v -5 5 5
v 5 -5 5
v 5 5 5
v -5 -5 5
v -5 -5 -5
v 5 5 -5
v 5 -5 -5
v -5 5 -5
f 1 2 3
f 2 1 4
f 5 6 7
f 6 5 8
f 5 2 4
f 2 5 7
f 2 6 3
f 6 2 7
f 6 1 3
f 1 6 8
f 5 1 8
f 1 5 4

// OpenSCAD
// A deliberately tiny OpenSCAD cartridge: the integration test's whole job is to prove
// the RUNNER works (command shape, OPENSCADPATH, STL back through the mesh bar), so the
// geometry is the simplest thing that can be watertight and have positive volume.
//
// It dispatches on BOTH the numeric render_mode (what the platform sends for a part
// whose manifest declares one) and the target_part string (what a cartridge that
// dispatches by name reads), because the renderer passes both and a fixture that
// exercises only one would not notice if the other stopped being sent.

block_size = 10;
hole_d = 3;
render_mode = 0;
target_part = "block";

module plain_block() {
    cube([block_size, block_size, block_size], center = true);
}

module drilled_block() {
    difference() {
        plain_block();
        cylinder(h = block_size * 2, d = hole_d, center = true, $fn = 32);
    }
}

if (render_mode == 2 || target_part == "drilled") {
    drilled_block();
} else {
    plain_block();
}
